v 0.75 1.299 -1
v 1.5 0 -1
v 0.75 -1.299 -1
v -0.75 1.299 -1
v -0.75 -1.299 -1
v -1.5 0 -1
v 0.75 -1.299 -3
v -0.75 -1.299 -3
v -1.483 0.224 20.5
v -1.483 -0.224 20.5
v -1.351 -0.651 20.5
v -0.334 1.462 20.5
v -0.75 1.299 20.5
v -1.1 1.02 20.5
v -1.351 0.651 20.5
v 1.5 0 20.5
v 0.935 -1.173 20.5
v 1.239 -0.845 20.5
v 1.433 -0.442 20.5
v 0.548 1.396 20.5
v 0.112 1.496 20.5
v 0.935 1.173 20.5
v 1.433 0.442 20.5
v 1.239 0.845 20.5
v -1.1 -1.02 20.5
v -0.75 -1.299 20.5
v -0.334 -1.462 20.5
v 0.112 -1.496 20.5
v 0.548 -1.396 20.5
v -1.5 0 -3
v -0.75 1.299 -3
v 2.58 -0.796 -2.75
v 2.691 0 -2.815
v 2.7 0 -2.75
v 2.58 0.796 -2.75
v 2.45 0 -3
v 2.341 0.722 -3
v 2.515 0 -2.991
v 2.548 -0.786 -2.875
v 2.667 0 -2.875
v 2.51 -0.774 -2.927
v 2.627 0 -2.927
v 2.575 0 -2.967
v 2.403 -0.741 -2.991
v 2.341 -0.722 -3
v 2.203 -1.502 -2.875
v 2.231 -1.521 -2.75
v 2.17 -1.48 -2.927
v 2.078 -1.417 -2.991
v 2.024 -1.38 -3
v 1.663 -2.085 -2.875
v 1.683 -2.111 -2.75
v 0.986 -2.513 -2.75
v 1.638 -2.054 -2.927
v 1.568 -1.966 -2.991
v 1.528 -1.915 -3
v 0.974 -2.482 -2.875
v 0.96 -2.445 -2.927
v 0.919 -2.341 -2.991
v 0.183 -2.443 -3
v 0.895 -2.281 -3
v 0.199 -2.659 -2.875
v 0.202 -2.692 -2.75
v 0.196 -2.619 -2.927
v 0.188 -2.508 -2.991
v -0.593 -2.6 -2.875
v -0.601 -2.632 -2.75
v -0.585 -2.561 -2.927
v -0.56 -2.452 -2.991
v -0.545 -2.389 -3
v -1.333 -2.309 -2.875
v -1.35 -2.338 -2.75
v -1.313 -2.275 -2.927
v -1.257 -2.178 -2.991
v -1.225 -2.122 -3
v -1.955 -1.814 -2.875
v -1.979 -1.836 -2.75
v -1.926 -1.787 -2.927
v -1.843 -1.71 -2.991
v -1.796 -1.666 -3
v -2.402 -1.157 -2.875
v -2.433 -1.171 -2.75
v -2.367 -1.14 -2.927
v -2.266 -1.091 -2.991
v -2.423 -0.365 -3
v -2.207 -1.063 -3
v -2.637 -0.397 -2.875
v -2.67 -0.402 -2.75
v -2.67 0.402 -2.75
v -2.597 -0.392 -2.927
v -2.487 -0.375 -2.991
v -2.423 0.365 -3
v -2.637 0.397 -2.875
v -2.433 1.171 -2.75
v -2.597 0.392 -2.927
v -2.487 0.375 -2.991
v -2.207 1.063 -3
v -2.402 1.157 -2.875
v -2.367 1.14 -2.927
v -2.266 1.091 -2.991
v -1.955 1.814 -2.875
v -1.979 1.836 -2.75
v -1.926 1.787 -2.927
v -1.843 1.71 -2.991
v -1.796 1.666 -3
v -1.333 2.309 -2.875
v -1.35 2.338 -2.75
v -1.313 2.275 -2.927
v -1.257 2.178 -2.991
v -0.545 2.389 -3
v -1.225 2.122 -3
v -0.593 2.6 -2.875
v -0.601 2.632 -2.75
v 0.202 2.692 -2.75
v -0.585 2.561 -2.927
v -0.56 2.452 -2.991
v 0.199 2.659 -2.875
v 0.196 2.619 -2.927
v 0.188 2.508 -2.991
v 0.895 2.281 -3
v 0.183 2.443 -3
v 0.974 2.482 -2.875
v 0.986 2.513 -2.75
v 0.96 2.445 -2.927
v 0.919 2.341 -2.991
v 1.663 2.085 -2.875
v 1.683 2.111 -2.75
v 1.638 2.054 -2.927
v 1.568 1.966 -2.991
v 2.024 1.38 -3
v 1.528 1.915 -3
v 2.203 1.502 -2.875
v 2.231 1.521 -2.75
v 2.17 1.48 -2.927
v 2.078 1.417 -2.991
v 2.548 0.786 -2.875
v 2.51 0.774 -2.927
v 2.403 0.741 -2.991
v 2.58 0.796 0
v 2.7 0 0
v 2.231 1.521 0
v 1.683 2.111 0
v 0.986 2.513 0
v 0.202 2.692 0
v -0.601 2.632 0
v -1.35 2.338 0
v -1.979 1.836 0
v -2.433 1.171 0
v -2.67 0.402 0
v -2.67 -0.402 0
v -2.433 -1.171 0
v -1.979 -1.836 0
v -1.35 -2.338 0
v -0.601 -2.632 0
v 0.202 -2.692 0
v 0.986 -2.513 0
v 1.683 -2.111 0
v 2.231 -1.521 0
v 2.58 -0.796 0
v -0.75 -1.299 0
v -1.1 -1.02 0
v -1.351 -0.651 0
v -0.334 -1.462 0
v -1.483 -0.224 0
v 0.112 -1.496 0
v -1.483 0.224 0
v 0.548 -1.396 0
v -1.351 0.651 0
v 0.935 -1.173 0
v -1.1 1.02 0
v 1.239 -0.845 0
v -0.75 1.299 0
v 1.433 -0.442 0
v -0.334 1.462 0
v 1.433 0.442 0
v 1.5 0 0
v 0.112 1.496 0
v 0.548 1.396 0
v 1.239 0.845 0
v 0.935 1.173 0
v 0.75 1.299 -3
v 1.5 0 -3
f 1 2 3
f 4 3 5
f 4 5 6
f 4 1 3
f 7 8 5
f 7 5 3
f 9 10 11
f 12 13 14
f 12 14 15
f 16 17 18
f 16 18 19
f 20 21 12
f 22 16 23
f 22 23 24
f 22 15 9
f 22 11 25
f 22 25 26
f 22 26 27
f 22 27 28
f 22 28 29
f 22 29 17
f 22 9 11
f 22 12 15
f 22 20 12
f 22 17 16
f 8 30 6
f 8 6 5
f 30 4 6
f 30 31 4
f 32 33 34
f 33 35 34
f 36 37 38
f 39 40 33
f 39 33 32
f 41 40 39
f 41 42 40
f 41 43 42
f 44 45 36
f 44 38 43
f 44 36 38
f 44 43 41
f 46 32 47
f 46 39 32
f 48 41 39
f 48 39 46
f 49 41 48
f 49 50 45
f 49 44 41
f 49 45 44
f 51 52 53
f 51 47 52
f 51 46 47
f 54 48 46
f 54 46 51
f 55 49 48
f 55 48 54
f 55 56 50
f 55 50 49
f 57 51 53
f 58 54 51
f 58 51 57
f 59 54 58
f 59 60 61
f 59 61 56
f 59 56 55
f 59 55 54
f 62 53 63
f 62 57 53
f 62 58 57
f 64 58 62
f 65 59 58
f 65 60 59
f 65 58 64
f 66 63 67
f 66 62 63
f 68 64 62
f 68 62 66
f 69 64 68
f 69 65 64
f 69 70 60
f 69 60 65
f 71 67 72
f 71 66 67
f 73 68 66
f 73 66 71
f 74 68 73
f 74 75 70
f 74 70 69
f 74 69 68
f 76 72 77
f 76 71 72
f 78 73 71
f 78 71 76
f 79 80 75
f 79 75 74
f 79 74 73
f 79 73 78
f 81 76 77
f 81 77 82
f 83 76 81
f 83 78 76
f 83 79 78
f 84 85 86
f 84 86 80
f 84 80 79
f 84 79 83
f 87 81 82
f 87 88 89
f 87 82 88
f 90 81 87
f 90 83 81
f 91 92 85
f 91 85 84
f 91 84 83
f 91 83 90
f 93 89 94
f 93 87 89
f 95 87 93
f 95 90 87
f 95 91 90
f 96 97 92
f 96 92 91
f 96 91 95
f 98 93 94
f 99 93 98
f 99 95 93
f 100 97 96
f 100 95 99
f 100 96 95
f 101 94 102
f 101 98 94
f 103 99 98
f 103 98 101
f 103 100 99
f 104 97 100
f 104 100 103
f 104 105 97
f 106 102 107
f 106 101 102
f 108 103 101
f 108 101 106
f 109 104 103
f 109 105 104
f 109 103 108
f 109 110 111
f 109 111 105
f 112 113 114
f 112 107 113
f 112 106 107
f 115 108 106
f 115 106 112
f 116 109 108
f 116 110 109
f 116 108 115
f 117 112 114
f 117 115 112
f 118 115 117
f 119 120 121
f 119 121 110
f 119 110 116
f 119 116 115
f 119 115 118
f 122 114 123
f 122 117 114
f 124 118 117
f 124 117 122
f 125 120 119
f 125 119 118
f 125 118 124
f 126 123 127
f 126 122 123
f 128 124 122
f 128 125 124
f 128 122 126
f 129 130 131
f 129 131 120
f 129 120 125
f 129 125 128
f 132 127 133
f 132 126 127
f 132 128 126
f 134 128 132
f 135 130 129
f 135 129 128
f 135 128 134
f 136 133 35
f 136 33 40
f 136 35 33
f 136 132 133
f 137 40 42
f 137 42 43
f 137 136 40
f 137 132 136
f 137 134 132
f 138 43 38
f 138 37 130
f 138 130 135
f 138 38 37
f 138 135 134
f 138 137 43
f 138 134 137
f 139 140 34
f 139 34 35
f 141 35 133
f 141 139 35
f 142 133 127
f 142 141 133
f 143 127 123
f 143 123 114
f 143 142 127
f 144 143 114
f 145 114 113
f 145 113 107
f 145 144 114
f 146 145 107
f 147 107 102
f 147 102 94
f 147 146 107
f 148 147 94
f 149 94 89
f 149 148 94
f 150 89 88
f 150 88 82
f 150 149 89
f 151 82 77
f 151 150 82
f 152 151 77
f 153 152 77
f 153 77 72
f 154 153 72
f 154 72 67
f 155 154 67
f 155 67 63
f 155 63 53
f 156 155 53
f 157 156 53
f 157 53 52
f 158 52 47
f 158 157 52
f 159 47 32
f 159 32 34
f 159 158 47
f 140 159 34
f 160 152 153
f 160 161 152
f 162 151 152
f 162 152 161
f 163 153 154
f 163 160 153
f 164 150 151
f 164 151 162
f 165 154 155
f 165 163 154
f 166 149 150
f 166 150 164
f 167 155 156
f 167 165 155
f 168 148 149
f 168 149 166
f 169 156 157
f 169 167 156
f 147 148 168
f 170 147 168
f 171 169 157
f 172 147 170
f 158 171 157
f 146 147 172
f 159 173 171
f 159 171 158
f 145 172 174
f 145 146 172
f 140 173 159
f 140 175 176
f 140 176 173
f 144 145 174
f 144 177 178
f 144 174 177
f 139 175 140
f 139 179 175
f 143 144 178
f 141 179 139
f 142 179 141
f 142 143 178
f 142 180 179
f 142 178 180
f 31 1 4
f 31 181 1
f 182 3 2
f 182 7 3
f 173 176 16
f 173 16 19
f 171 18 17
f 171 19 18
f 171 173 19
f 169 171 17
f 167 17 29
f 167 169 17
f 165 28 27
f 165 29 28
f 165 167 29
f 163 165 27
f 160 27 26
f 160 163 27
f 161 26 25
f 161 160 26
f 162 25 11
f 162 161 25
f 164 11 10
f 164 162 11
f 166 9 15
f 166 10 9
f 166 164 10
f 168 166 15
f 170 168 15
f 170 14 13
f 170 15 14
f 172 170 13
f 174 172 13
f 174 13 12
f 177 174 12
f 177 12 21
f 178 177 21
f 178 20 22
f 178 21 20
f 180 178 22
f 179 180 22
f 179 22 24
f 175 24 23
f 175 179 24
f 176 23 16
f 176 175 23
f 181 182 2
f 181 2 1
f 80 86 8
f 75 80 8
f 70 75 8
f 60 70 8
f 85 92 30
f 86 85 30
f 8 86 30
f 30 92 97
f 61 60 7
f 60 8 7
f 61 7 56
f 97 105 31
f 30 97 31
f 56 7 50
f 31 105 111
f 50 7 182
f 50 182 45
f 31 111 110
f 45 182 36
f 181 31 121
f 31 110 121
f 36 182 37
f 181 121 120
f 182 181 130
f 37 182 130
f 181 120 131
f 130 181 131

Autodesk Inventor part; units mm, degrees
ref_plane "YZ Plane" through (0, 0, 0) normal (1, 0, 0) x (0, 1, 0)
ref_plane "XZ Plane" through (0, 0, 0) normal (0, 1, 0) x (-1, 0, 0)
ref_plane "XY Plane" through (0, 0, 0) normal (0, 0, 1) x (1, 0, 0)
sketch "Sketch1" plane through (0, 0, 0) normal (0, 0, 1) x (1, 0, 0)
  circle A0 centre (0, 0) radius 1.5
  circle A1 centre (0, 0) radius 2.7
  dimension "d0" = 3
  dimension "d5" = 5.4
extrude "Extrusion1" add sketch "Sketch1" along normal blind 20.5 contours A0
extrude "Extrusion2" add sketch "Sketch1" against normal blind 3 contours A0 | A1
thread "Thread2" size "M3x0.5" class "6g" standard "ANSI Metric M Profile" length 4.5
fillet "Fillet1" radius 0.25 1 edges at (-2.7, 0, -3)
sketch "Sketch2" plane through (0, 0, -3) normal (0, 0, -1) x (-1, 0, 0)
  circle A0 centre (0, 0) radius 1.5 projected
  line L0 (-1.5, 0) -> (-0.75, 1.299)
  line L1 (-0.75, 1.299) -> (0.75, 1.299)
  line L2 (0.75, 1.299) -> (1.5, 0)
  line L3 (1.5, 0) -> (0.75, -1.299)
  line L4 (0.75, -1.299) -> (-0.75, -1.299)
  line L5 (-0.75, -1.299) -> (-1.5, 0)
extrude "Extrusion3" cut sketch "Sketch2" against normal blind 2 contours L3 L4 L5 L0 L1 L2
properties part number "COTS_GENERIC_Solenoid_Actuator_Push_Rod_M3"
